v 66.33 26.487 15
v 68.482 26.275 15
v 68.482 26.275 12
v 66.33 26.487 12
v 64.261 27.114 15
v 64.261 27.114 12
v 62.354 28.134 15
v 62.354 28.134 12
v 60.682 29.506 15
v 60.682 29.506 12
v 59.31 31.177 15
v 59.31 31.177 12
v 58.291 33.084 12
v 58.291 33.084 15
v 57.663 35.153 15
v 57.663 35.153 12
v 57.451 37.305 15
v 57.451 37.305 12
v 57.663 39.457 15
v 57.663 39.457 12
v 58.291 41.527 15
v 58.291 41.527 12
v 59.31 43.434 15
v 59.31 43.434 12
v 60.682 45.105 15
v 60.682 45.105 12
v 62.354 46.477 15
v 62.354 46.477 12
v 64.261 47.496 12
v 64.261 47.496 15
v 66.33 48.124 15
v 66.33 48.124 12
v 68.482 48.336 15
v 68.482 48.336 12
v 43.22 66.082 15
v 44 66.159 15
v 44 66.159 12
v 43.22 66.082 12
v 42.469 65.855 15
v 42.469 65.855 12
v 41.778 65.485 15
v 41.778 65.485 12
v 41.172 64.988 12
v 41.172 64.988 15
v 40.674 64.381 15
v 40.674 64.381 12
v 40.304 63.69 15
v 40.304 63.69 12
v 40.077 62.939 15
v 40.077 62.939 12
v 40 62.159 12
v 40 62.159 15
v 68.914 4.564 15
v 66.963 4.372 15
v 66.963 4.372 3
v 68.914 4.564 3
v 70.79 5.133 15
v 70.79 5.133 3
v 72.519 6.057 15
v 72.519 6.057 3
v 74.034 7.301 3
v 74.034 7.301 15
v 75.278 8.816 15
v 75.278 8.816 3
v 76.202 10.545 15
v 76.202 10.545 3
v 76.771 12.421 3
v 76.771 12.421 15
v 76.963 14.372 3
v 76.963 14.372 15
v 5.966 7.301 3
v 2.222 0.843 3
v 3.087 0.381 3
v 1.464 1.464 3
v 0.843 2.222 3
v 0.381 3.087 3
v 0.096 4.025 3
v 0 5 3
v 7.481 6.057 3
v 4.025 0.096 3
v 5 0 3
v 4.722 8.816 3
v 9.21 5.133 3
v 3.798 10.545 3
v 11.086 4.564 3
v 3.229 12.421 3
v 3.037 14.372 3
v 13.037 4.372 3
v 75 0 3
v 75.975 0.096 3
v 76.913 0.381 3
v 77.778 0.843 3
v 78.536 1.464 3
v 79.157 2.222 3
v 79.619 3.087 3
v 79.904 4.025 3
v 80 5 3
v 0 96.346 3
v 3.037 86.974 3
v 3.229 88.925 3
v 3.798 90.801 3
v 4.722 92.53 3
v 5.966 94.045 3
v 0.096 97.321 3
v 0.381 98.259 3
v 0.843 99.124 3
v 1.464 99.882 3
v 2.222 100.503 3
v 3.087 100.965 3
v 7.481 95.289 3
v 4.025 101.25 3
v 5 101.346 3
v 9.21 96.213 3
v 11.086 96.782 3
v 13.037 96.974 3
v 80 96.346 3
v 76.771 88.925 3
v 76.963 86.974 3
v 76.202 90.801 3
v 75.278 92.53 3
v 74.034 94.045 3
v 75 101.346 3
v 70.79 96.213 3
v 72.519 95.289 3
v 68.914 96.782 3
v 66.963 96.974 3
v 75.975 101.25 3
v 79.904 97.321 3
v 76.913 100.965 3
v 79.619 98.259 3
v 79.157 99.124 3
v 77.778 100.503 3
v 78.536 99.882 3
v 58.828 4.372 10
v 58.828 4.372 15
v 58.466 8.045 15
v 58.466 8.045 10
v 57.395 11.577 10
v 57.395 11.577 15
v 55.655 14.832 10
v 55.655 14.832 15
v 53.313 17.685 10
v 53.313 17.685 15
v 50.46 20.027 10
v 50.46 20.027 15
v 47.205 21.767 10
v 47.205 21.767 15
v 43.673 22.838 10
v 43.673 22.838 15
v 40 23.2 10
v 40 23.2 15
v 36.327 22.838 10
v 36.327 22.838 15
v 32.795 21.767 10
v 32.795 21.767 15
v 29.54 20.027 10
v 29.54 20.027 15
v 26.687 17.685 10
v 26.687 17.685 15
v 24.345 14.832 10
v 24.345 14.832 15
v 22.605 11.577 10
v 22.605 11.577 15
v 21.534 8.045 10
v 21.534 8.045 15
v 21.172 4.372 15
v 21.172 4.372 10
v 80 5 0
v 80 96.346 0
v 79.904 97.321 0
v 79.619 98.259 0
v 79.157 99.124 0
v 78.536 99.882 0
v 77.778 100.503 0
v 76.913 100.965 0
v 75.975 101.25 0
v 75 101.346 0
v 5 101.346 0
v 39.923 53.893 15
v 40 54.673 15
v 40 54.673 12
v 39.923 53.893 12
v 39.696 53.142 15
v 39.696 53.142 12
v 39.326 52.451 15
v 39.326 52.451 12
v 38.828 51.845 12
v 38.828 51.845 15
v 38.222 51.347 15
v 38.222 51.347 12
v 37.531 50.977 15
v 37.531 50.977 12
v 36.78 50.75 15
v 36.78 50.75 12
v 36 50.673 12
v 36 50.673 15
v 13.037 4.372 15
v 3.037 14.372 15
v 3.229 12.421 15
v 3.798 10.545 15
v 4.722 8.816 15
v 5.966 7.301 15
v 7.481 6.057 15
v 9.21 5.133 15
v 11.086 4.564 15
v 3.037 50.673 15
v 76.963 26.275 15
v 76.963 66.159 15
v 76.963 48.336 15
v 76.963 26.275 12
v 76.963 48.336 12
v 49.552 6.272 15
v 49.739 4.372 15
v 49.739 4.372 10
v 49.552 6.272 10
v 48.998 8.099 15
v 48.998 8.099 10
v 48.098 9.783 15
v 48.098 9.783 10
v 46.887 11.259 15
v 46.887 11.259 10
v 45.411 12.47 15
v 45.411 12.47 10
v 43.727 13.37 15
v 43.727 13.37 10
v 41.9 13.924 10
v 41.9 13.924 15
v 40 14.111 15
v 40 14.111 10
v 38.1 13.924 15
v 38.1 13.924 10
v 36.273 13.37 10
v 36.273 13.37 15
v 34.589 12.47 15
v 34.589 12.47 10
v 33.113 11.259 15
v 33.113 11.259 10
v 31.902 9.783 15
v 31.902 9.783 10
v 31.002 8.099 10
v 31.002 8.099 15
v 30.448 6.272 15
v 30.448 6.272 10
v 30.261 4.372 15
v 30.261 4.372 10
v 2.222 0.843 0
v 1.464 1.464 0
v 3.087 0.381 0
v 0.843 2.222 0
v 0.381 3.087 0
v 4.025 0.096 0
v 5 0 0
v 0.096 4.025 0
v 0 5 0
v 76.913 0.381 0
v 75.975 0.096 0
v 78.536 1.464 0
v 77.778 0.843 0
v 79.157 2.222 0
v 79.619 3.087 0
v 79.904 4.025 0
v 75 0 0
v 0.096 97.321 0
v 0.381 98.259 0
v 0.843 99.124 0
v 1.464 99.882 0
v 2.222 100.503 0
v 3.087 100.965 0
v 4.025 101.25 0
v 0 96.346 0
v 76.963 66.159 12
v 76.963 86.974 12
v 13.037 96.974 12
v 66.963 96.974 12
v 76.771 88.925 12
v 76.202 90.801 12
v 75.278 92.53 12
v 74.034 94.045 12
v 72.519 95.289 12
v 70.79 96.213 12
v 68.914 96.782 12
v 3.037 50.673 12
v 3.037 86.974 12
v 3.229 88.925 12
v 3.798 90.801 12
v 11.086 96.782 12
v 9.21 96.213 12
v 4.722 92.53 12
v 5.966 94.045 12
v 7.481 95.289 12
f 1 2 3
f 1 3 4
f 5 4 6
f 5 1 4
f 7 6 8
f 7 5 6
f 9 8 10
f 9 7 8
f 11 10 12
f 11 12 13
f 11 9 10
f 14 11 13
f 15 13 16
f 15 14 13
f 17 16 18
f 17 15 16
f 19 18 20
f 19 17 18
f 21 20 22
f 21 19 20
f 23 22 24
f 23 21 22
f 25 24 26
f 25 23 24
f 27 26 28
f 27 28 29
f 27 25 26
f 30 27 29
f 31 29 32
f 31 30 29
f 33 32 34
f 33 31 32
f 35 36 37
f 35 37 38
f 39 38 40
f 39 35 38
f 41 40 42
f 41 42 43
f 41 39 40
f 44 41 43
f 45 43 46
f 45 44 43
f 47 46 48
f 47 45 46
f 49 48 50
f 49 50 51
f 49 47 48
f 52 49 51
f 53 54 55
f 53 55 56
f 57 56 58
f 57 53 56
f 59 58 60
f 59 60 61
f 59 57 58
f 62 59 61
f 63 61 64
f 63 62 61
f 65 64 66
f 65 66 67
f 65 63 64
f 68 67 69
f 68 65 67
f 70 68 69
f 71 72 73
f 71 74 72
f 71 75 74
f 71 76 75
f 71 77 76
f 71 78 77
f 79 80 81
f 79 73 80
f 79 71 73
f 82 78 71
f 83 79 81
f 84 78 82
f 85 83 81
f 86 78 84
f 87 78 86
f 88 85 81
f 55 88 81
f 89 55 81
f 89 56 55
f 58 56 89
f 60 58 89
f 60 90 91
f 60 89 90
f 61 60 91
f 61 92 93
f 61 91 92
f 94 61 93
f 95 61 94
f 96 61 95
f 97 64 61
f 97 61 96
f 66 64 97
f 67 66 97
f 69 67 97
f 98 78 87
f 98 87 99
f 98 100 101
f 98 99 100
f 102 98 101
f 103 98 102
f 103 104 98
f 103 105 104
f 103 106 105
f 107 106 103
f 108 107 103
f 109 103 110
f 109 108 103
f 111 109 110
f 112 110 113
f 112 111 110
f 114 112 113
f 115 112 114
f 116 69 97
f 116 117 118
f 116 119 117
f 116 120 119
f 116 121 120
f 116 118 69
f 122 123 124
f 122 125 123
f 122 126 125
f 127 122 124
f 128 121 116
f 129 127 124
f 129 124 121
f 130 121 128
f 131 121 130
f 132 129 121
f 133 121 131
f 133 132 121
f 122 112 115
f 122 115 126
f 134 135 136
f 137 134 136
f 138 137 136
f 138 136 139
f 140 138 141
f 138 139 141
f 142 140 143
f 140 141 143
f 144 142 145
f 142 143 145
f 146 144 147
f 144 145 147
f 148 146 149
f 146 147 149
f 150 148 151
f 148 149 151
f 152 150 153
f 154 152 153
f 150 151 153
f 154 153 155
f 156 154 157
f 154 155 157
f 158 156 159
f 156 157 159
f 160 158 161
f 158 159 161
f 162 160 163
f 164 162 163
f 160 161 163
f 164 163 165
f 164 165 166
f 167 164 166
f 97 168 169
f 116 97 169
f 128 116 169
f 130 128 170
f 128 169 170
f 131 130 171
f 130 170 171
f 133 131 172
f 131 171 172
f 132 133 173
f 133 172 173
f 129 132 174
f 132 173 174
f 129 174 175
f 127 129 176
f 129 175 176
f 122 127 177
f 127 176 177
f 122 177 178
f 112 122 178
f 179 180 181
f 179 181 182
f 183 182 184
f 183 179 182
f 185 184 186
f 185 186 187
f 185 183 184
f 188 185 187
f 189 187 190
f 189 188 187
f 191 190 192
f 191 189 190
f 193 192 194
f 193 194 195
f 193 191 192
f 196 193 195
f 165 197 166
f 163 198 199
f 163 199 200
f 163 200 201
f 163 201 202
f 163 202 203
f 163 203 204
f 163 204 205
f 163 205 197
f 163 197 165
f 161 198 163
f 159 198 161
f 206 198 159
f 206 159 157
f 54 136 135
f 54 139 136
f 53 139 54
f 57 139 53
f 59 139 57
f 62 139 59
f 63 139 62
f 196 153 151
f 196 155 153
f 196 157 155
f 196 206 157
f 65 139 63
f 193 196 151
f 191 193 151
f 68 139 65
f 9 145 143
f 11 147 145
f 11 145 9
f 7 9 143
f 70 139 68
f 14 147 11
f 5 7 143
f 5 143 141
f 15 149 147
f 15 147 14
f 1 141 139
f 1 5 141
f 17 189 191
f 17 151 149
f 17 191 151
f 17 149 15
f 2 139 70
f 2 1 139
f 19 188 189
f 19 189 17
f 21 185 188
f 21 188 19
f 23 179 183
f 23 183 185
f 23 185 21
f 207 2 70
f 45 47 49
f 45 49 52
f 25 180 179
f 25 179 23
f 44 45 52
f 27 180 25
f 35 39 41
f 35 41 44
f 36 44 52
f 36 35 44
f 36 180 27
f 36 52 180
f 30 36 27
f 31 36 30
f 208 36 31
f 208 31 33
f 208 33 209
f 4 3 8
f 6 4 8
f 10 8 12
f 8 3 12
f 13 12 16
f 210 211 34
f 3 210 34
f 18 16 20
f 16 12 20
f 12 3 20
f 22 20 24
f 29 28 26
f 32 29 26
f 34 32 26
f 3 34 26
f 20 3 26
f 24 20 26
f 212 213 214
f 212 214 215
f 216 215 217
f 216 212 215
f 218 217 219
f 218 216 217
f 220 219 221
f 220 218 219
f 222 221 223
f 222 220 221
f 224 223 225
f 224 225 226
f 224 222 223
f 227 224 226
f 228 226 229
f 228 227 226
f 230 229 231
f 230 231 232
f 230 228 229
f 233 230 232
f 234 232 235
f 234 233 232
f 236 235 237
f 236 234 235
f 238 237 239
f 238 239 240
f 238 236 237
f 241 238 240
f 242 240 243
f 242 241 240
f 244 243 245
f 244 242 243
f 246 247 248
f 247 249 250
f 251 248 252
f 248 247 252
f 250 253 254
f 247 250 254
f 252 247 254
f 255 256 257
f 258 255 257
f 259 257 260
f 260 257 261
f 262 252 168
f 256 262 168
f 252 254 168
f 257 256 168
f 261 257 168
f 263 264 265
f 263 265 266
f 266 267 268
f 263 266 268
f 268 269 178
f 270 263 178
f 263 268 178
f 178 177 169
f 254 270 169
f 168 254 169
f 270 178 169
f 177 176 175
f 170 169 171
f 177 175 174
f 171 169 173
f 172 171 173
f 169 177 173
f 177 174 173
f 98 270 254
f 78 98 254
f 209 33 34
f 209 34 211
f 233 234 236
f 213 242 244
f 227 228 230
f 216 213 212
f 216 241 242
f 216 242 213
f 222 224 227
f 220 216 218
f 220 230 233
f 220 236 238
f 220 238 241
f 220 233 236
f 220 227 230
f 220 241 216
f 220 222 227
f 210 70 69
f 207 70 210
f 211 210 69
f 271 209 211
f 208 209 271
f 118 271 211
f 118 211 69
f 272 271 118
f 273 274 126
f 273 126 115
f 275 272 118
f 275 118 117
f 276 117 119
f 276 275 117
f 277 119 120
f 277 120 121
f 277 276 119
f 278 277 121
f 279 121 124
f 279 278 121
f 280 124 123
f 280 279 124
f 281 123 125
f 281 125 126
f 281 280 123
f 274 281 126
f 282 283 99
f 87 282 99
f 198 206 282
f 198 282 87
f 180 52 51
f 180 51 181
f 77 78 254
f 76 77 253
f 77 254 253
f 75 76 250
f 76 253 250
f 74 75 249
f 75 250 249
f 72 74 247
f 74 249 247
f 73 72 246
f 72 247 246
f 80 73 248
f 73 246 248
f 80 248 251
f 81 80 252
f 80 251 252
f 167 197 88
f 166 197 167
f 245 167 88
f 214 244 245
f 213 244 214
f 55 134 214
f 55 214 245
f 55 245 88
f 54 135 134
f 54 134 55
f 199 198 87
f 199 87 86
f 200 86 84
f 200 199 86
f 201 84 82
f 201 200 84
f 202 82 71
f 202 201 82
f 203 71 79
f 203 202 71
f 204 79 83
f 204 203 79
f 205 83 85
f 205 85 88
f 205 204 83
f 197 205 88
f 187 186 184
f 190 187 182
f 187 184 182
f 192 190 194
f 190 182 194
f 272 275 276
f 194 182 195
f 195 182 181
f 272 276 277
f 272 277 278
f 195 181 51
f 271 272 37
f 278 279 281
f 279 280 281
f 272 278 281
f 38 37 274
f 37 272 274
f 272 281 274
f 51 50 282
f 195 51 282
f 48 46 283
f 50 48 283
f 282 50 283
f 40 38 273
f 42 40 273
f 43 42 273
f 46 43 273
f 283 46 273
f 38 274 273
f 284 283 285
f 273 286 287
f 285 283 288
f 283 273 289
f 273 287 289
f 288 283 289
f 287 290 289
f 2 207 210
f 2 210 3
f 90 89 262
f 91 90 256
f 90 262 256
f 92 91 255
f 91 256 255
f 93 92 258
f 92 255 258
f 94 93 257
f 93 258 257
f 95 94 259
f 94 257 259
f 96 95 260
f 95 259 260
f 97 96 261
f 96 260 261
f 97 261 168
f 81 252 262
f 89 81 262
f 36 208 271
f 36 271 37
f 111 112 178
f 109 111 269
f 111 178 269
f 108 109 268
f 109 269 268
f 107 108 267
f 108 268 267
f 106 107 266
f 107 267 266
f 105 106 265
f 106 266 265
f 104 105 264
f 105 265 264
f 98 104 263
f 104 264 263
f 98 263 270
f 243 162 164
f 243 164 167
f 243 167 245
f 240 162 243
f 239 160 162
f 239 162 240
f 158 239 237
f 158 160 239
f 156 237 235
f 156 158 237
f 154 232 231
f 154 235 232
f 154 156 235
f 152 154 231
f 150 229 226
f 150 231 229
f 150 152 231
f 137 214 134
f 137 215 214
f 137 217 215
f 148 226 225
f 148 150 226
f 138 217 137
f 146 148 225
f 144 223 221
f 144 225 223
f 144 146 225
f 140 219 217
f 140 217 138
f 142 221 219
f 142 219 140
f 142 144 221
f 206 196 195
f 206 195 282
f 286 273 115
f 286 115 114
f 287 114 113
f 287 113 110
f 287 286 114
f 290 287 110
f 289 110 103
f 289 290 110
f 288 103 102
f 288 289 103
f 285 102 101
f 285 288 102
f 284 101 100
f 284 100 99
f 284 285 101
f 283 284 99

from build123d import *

# Parameters (mm, degrees)
BOSS_EXTRUDE1_DEPTH = 15
SKETCH3_W           = 104.423940592
SKETCH3_H           = 121.358720552
CUT_EXTRUDE1_DEPTH  = 12
CUT_EXTRUDE2_DEPTH  = 3
CUT_EXTRUDE3_DEPTH  = 3
SKETCH6_R           = 18.828058828
SKETCH6_R_2         = 9.739436554
CUT_EXTRUDE4_DEPTH  = 5


with BuildPart() as part:
    # Sketch1 → Boss-Extrude1 (new body)
    with BuildSketch(Plane.XY):
        with BuildLine():
            Line((5, 0), (75, 0))
            ThreePointArc((75, 0), (78.535533906, 1.464466094), (80, 5))
            Line((80, 5), (80, 96.346))
            ThreePointArc((80, 96.346), (78.535533906, 99.881533906), (75, 101.346))
            Line((75, 101.346), (5, 101.346))
            ThreePointArc((5, 101.346), (1.464466094, 99.881533906), (0, 96.346))
            Line((0, 96.346), (0, 5))
            ThreePointArc((0, 5), (1.464466094, 1.464466094), (5, 0))
        make_face()
    extrude(amount=BOSS_EXTRUDE1_DEPTH)

    # Sketch3 → Cut-Extrude1 (cut)
    with BuildSketch(Plane.XY.offset(15)):
        with Locations((40, 50.673)):
            Rectangle(SKETCH3_W, SKETCH3_H)
        with BuildLine():
            Line((13.037037944, 4.371762639), (66.962962056, 4.371762639))
            ThreePointArc((66.962962056, 4.371762639), (74.034029868, 7.300694827), (76.962962056, 14.371762639))
            Line((76.962962056, 14.371762639), (76.962962056, 86.974237361))
            ThreePointArc((76.962962056, 86.974237361), (74.034029868, 94.045305173), (66.962962056, 96.974237361))
            Line((66.962962056, 96.974237361), (13.037037944, 96.974237361))
            ThreePointArc((13.037037944, 96.974237361), (5.965970132, 94.045305173), (3.037037944, 86.974237361))
            Line((3.037037944, 86.974237361), (3.037037944, 14.371762639))
            ThreePointArc((3.037037944, 14.371762639), (5.965970132, 7.300694827), (13.037037944, 4.371762639))
        make_face(mode=Mode.SUBTRACT)
    extrude(amount=-CUT_EXTRUDE1_DEPTH, mode=Mode.SUBTRACT)

    # Sketch4 → Cut-Extrude2 (cut)
    with BuildSketch(Plane.XY.offset(15)):
        with BuildLine():
            Line((36, 50.673), (3.037037944, 50.673))
            Line((3.037037944, 50.673), (3.037037944, 113.13523252))
            Line((3.037037944, 113.13523252), (76.962962056, 113.13523252))
            Line((76.962962056, 113.13523252), (76.962962056, 66.159087484))
            Line((76.962962056, 66.159087484), (44, 66.159087484))
            ThreePointArc((44, 66.159087484), (41.171572875, 64.987514609), (40, 62.159087484))
            Line((40, 62.159087484), (40, 54.673))
            ThreePointArc((40, 54.673), (38.828427125, 51.844572875), (36, 50.673))
        make_face()
    extrude(amount=-CUT_EXTRUDE2_DEPTH, mode=Mode.SUBTRACT)

    # Sketch5 → Cut-Extrude3 (cut)
    with BuildSketch(Plane.XY.offset(15)):
        with BuildLine():
            Line((83.710638267, 26.274744542), (68.481884822, 26.274744542))
            ThreePointArc((68.481884822, 26.274744542), (57.451328272, 37.305301092), (68.481884822, 48.335857641))
            Line((68.481884822, 48.335857641), (83.710638267, 48.335857641))
            ThreePointArc((83.710638267, 48.335857641), (94.741194817, 37.305301092), (83.710638267, 26.274744542))
        make_face()
    extrude(amount=-CUT_EXTRUDE3_DEPTH, mode=Mode.SUBTRACT)

    # Sketch6 → Cut-Extrude4 (cut)
    with BuildSketch(Plane.XY.offset(15)):
        with Locations((40, 4.371762639)):
            Circle(SKETCH6_R)
        with Locations((40, 4.371762639)):
            Circle(SKETCH6_R_2, mode=Mode.SUBTRACT)
    extrude(amount=-CUT_EXTRUDE4_DEPTH, mode=Mode.SUBTRACT)


solid = part.part
